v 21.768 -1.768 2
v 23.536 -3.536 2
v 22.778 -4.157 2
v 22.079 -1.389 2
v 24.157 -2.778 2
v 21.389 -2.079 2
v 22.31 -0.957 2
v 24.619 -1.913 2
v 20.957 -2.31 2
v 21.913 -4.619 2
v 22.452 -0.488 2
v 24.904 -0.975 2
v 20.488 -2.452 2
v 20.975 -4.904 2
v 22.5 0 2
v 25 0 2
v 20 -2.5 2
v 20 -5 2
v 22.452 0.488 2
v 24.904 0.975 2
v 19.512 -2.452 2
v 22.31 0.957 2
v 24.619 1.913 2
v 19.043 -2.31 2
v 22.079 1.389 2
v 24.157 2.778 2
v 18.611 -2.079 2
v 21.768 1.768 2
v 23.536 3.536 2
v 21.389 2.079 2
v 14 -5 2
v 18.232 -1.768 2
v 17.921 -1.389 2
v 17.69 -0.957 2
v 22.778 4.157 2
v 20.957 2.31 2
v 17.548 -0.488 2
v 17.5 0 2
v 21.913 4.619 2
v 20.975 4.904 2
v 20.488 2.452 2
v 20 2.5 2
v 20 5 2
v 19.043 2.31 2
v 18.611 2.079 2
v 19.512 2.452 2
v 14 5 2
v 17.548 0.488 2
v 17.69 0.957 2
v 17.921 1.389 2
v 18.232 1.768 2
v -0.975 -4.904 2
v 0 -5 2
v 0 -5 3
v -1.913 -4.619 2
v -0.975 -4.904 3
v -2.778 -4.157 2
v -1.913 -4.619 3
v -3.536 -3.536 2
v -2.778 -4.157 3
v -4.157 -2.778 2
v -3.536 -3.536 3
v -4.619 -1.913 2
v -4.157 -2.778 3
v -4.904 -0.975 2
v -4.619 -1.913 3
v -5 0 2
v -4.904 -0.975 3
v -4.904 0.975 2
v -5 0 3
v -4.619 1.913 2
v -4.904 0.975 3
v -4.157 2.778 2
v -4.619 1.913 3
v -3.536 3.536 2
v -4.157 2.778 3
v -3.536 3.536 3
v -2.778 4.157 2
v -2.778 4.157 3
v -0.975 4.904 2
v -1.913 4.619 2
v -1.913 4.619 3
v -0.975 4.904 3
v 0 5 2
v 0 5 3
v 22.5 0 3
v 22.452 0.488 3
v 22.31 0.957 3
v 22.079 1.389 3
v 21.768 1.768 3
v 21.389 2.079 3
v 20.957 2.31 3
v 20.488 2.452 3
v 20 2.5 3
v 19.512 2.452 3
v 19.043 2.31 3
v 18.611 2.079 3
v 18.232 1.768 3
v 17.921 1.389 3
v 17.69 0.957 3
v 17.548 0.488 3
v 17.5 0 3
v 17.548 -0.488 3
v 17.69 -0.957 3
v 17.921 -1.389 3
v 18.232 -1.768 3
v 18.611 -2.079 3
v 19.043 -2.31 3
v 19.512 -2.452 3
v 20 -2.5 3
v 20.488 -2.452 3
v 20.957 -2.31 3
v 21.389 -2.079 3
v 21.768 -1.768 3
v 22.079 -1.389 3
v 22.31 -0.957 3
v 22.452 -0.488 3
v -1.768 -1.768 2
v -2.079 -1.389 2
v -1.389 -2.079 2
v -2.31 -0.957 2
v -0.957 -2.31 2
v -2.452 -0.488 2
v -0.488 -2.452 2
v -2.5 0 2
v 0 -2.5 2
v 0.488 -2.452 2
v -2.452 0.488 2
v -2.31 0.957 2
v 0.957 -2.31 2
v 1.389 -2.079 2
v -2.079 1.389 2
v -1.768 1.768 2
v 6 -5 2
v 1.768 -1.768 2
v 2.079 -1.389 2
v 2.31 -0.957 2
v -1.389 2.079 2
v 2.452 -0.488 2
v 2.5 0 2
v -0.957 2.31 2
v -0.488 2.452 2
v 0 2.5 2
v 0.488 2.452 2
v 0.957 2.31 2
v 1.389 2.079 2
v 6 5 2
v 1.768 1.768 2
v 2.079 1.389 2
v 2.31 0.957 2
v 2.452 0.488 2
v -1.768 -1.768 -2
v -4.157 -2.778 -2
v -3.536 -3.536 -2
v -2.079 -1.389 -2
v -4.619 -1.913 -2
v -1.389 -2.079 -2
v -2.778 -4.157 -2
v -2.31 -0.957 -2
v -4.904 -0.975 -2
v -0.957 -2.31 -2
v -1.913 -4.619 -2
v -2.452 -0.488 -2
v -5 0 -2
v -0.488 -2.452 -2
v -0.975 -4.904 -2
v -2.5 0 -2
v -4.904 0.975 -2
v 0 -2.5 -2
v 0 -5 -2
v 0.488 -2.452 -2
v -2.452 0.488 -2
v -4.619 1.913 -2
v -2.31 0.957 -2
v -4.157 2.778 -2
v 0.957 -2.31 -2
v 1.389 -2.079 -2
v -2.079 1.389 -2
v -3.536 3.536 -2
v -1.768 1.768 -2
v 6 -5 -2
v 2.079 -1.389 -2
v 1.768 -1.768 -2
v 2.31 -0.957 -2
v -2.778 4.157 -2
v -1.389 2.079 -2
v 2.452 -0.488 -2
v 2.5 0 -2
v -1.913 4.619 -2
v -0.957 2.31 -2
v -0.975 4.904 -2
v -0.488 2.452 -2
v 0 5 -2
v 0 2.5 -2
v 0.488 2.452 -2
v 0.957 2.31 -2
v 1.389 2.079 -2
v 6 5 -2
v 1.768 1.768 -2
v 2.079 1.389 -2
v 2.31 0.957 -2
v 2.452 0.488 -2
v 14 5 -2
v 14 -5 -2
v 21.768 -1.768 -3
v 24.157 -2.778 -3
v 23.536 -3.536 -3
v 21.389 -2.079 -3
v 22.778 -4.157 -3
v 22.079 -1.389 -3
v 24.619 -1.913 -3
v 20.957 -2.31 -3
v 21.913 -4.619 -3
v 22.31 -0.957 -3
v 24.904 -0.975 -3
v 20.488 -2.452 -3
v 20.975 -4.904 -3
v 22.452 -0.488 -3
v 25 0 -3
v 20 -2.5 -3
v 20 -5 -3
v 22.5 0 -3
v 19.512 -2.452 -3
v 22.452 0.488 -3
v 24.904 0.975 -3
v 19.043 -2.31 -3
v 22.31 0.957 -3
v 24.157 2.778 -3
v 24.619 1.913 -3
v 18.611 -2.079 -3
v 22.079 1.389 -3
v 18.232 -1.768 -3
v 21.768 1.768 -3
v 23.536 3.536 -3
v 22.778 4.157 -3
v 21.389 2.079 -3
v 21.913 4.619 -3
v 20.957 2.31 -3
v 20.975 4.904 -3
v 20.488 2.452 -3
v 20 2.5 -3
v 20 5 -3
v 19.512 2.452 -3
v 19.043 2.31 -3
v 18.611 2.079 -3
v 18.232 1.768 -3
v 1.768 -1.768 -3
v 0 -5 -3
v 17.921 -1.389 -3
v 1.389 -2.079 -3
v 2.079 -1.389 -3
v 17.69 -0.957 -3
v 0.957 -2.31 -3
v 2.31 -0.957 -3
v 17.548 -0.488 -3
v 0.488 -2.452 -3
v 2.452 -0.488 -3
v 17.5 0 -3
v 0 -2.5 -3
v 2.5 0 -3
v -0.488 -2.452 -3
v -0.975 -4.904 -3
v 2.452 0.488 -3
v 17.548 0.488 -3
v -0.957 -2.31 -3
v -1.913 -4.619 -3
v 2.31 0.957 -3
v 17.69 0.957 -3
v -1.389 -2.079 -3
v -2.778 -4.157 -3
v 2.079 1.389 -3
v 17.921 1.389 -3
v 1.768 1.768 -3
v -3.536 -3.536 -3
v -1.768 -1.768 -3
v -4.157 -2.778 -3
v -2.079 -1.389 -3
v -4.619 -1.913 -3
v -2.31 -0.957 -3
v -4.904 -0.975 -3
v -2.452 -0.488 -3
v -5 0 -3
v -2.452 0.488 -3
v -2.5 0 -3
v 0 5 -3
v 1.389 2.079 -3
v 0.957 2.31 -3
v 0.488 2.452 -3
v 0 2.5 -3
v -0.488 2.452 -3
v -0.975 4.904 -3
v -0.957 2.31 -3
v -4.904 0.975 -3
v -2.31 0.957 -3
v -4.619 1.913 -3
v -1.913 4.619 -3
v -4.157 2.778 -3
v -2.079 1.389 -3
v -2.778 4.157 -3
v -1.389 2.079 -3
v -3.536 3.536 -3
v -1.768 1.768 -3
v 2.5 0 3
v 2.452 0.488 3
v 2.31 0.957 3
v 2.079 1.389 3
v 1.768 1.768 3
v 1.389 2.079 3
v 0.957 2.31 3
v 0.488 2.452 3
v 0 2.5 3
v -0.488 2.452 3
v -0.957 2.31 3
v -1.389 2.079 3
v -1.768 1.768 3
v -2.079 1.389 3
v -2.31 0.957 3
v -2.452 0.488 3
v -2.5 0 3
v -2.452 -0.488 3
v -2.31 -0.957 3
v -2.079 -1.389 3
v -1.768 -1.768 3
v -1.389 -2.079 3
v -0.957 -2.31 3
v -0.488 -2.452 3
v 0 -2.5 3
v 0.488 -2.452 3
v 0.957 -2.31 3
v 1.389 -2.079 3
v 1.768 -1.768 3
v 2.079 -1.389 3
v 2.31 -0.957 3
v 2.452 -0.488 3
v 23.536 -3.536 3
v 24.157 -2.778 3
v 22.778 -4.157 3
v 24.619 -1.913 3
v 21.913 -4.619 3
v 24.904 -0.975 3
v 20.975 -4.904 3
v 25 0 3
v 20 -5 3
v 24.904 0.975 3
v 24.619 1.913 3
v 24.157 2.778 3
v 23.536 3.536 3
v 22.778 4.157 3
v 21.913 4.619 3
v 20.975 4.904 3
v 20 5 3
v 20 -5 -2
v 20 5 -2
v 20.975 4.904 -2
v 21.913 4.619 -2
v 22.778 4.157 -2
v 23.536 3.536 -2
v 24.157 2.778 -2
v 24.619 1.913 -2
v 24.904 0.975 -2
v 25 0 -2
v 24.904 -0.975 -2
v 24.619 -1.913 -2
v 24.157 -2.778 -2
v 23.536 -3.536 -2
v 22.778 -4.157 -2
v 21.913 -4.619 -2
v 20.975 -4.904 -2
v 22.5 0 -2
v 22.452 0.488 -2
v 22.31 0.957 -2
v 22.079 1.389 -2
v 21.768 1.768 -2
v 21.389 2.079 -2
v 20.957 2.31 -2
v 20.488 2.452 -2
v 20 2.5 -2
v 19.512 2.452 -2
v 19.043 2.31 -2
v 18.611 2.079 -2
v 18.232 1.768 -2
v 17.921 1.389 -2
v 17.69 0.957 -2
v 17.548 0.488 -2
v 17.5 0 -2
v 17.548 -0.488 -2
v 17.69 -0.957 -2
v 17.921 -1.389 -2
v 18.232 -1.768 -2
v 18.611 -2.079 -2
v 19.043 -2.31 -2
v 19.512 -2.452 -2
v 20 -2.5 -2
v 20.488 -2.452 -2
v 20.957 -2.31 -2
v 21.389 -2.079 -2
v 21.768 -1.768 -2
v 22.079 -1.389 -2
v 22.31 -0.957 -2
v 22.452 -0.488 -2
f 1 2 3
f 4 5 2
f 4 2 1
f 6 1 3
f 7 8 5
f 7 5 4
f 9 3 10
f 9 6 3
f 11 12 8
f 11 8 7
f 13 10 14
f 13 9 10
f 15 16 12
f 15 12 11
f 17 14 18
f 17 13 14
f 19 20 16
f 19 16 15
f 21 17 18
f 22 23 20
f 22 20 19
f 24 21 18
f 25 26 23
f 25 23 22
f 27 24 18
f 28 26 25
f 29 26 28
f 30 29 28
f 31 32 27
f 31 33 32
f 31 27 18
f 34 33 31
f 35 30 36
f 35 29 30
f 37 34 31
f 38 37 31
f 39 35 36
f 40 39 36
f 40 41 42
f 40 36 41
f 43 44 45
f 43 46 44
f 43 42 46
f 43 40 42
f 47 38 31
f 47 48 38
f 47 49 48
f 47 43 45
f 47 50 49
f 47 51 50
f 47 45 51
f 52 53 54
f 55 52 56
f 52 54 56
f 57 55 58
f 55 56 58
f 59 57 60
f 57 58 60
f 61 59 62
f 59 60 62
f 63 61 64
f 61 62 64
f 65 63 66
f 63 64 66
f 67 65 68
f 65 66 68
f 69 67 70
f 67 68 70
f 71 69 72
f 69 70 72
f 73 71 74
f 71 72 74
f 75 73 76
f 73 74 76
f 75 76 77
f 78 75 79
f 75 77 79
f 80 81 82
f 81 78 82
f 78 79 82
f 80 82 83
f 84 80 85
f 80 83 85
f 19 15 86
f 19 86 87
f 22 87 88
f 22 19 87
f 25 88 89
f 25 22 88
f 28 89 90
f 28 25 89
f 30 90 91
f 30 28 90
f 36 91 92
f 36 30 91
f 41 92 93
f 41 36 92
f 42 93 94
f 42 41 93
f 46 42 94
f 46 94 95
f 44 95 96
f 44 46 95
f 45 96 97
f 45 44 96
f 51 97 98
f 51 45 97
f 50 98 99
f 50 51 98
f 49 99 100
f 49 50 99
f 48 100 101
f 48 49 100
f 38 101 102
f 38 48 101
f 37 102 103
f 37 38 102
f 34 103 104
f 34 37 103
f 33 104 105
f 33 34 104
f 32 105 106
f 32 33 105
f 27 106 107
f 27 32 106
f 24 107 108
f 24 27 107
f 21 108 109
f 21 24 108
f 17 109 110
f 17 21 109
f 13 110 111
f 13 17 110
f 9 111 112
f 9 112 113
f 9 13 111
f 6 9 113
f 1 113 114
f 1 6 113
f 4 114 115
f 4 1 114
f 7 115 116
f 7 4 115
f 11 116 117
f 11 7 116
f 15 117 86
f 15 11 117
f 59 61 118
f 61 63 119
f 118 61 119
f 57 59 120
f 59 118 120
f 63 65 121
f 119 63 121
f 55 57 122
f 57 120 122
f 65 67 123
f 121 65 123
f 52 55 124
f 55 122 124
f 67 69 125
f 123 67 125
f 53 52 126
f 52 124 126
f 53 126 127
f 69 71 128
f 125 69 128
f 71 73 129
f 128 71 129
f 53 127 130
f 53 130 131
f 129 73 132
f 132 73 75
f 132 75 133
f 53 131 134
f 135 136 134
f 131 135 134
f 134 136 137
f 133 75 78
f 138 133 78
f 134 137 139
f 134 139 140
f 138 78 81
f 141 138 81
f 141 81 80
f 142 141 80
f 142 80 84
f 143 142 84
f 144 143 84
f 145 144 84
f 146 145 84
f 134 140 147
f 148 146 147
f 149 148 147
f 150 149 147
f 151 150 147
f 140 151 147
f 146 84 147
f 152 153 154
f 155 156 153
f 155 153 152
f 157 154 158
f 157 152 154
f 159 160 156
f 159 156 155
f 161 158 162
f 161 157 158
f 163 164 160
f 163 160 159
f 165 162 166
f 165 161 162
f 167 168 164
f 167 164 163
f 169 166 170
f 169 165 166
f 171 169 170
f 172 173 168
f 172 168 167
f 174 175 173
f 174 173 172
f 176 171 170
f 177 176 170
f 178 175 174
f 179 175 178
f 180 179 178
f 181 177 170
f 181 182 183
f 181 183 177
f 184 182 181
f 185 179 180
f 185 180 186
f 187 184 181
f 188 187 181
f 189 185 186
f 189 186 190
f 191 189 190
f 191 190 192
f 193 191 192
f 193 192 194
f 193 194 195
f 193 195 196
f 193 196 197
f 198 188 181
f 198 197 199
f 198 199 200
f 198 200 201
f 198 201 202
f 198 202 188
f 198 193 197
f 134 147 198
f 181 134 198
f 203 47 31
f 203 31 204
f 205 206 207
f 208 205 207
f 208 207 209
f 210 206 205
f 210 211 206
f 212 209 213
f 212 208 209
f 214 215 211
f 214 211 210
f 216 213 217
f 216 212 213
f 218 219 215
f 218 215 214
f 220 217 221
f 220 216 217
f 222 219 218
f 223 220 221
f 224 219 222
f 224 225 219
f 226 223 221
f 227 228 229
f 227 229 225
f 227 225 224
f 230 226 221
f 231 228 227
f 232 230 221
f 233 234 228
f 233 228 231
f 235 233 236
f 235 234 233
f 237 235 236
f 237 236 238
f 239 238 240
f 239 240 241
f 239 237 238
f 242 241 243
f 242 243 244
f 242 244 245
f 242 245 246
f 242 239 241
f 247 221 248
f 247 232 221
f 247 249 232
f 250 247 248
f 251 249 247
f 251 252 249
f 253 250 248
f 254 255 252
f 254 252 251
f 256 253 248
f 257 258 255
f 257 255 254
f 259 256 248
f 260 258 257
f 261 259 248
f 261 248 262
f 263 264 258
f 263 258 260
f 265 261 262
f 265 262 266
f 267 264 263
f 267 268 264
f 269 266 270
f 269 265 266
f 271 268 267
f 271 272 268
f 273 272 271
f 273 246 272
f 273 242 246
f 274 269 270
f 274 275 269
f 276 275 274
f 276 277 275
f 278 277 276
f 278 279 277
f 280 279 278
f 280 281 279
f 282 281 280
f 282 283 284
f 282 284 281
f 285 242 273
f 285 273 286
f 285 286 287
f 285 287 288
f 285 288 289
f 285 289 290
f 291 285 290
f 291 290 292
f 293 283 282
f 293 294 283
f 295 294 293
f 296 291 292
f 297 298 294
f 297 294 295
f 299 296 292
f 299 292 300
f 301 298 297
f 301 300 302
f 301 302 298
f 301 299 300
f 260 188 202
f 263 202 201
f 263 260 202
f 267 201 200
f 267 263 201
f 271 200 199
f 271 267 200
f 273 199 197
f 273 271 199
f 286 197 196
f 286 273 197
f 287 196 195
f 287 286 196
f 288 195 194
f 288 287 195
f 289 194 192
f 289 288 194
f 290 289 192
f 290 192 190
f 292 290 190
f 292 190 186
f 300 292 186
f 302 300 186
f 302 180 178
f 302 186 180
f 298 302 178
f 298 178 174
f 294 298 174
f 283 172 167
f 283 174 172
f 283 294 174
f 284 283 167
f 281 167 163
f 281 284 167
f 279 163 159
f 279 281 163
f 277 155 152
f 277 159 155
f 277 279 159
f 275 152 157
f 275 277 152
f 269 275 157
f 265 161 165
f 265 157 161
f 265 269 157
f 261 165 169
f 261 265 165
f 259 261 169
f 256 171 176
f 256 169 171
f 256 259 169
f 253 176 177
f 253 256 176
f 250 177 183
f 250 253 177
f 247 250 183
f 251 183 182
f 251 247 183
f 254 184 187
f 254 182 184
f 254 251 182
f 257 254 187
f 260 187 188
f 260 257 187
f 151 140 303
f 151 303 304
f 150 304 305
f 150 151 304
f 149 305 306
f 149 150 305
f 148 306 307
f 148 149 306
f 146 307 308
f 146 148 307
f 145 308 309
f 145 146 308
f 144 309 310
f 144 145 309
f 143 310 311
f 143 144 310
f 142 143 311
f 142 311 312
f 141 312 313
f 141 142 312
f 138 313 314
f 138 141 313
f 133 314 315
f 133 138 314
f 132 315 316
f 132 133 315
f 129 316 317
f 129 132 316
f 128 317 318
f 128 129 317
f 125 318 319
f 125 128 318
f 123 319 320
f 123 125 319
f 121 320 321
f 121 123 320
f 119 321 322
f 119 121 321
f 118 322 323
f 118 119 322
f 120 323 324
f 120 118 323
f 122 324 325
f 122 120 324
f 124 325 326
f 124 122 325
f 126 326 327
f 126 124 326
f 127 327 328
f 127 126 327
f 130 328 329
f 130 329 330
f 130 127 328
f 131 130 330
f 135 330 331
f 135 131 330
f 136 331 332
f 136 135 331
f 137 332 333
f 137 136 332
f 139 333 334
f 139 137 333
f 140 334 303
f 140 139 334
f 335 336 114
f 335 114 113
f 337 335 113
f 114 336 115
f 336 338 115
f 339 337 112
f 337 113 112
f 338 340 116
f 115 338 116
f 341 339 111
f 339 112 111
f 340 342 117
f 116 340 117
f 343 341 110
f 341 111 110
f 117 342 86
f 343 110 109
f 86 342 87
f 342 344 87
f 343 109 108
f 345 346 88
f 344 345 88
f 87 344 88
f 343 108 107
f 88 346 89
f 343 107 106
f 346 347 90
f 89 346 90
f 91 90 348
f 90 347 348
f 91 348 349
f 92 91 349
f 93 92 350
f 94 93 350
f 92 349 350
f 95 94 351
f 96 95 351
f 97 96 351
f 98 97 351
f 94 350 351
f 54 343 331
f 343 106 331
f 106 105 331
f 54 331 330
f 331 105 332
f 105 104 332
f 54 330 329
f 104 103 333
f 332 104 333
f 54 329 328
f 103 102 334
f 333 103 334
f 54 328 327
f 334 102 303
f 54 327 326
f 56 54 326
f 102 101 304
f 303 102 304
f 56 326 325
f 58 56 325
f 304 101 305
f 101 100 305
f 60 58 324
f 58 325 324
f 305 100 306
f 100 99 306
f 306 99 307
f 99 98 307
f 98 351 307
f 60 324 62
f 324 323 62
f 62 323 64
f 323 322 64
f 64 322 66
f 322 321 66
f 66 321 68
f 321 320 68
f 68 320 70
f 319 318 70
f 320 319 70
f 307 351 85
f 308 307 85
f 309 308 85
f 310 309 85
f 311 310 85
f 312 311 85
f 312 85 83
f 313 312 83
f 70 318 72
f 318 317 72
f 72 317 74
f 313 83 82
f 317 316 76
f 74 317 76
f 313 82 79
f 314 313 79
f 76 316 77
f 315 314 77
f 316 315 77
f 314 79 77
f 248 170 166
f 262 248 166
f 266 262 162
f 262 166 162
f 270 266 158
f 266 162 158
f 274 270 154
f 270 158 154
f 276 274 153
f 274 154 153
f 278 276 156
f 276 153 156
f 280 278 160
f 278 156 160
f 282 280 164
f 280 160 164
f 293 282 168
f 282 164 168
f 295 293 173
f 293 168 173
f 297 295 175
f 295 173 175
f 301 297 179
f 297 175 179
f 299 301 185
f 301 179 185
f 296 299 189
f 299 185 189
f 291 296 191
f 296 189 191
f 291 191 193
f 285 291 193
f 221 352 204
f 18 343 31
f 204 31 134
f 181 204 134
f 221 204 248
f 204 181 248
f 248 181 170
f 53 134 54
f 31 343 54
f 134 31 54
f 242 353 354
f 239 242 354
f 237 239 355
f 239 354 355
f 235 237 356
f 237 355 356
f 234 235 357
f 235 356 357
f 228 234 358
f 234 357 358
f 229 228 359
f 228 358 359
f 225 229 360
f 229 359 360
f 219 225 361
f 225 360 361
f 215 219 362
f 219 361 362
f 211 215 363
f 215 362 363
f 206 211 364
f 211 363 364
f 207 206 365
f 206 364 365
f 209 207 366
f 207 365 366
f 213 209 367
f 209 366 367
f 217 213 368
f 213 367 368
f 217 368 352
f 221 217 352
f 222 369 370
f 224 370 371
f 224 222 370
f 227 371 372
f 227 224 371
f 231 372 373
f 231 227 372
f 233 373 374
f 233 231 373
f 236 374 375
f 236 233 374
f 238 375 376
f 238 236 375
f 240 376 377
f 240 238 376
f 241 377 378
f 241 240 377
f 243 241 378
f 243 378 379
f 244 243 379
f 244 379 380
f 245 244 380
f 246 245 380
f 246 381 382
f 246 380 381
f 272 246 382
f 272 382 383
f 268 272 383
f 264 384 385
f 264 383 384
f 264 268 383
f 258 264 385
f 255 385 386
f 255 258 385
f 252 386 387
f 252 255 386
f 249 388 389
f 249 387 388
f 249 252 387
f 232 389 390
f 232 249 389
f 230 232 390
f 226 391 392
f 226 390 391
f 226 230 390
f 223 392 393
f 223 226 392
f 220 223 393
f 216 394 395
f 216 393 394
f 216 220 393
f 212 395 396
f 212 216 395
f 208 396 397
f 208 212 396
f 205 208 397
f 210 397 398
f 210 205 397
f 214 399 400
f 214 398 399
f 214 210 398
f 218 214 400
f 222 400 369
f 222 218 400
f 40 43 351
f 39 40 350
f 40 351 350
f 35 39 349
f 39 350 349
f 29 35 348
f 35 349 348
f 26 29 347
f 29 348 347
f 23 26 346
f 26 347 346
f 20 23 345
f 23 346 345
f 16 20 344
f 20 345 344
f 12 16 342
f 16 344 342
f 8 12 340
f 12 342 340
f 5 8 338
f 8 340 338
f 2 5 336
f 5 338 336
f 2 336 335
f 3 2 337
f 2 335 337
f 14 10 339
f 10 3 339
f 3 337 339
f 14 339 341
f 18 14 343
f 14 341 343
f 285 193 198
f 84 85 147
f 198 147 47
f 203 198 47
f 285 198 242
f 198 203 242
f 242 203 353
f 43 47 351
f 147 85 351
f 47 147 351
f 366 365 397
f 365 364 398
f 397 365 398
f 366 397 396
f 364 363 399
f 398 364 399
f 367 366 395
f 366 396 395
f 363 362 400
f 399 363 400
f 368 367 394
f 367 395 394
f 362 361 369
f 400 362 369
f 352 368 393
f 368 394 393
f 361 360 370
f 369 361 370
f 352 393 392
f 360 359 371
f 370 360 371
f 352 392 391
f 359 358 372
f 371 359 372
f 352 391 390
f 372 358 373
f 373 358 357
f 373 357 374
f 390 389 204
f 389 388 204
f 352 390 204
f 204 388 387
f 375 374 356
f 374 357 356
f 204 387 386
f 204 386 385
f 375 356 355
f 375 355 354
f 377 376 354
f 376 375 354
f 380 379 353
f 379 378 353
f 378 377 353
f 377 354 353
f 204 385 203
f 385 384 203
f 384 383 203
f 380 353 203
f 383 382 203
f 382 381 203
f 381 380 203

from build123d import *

# Parameters (mm, degrees)
SKETCH1_R           = 2.5
BOSS_EXTRUDE1_DEPTH = 3
SKETCH2_W           = 20
SKETCH2_H           = 4
CUT_EXTRUDE1_DEPTH  = 28.092434368


with BuildPart() as part:
    # Sketch1 → Boss-Extrude1 (new, symmetric)
    with BuildSketch(Plane.XY):
        with BuildLine():
            Line((0, 5), (20, 5))
            ThreePointArc((20, 5), (25, 0), (20, -5))
            Line((20, -5), (0, -5))
            ThreePointArc((0, -5), (-5, 0), (0, 5))
        make_face()
        Circle(SKETCH1_R, mode=Mode.SUBTRACT)
        with Locations((20, 0)):
            Circle(SKETCH1_R, mode=Mode.SUBTRACT)
    extrude(amount=BOSS_EXTRUDE1_DEPTH, both=True)

    # Sketch2 → Cut-Extrude1 (cut, through all)
    with BuildSketch(Plane(origin=(0, 5, 0), x_dir=(1, 0, 0), z_dir=(0, 1, 0))):
        with Locations((-4, 0)):
            Rectangle(SKETCH2_W, SKETCH2_H)
    cut_extrude1 = extrude(amount=-CUT_EXTRUDE1_DEPTH, mode=Mode.SUBTRACT)

    # Mirror1: Cut-Extrude1 across plane
    add(cut_extrude1.mirror(Plane(origin=(10, 0, 0), x_dir=(0, 0, 1), z_dir=(1, 0, 0))), mode=Mode.SUBTRACT)


solid = part.part
